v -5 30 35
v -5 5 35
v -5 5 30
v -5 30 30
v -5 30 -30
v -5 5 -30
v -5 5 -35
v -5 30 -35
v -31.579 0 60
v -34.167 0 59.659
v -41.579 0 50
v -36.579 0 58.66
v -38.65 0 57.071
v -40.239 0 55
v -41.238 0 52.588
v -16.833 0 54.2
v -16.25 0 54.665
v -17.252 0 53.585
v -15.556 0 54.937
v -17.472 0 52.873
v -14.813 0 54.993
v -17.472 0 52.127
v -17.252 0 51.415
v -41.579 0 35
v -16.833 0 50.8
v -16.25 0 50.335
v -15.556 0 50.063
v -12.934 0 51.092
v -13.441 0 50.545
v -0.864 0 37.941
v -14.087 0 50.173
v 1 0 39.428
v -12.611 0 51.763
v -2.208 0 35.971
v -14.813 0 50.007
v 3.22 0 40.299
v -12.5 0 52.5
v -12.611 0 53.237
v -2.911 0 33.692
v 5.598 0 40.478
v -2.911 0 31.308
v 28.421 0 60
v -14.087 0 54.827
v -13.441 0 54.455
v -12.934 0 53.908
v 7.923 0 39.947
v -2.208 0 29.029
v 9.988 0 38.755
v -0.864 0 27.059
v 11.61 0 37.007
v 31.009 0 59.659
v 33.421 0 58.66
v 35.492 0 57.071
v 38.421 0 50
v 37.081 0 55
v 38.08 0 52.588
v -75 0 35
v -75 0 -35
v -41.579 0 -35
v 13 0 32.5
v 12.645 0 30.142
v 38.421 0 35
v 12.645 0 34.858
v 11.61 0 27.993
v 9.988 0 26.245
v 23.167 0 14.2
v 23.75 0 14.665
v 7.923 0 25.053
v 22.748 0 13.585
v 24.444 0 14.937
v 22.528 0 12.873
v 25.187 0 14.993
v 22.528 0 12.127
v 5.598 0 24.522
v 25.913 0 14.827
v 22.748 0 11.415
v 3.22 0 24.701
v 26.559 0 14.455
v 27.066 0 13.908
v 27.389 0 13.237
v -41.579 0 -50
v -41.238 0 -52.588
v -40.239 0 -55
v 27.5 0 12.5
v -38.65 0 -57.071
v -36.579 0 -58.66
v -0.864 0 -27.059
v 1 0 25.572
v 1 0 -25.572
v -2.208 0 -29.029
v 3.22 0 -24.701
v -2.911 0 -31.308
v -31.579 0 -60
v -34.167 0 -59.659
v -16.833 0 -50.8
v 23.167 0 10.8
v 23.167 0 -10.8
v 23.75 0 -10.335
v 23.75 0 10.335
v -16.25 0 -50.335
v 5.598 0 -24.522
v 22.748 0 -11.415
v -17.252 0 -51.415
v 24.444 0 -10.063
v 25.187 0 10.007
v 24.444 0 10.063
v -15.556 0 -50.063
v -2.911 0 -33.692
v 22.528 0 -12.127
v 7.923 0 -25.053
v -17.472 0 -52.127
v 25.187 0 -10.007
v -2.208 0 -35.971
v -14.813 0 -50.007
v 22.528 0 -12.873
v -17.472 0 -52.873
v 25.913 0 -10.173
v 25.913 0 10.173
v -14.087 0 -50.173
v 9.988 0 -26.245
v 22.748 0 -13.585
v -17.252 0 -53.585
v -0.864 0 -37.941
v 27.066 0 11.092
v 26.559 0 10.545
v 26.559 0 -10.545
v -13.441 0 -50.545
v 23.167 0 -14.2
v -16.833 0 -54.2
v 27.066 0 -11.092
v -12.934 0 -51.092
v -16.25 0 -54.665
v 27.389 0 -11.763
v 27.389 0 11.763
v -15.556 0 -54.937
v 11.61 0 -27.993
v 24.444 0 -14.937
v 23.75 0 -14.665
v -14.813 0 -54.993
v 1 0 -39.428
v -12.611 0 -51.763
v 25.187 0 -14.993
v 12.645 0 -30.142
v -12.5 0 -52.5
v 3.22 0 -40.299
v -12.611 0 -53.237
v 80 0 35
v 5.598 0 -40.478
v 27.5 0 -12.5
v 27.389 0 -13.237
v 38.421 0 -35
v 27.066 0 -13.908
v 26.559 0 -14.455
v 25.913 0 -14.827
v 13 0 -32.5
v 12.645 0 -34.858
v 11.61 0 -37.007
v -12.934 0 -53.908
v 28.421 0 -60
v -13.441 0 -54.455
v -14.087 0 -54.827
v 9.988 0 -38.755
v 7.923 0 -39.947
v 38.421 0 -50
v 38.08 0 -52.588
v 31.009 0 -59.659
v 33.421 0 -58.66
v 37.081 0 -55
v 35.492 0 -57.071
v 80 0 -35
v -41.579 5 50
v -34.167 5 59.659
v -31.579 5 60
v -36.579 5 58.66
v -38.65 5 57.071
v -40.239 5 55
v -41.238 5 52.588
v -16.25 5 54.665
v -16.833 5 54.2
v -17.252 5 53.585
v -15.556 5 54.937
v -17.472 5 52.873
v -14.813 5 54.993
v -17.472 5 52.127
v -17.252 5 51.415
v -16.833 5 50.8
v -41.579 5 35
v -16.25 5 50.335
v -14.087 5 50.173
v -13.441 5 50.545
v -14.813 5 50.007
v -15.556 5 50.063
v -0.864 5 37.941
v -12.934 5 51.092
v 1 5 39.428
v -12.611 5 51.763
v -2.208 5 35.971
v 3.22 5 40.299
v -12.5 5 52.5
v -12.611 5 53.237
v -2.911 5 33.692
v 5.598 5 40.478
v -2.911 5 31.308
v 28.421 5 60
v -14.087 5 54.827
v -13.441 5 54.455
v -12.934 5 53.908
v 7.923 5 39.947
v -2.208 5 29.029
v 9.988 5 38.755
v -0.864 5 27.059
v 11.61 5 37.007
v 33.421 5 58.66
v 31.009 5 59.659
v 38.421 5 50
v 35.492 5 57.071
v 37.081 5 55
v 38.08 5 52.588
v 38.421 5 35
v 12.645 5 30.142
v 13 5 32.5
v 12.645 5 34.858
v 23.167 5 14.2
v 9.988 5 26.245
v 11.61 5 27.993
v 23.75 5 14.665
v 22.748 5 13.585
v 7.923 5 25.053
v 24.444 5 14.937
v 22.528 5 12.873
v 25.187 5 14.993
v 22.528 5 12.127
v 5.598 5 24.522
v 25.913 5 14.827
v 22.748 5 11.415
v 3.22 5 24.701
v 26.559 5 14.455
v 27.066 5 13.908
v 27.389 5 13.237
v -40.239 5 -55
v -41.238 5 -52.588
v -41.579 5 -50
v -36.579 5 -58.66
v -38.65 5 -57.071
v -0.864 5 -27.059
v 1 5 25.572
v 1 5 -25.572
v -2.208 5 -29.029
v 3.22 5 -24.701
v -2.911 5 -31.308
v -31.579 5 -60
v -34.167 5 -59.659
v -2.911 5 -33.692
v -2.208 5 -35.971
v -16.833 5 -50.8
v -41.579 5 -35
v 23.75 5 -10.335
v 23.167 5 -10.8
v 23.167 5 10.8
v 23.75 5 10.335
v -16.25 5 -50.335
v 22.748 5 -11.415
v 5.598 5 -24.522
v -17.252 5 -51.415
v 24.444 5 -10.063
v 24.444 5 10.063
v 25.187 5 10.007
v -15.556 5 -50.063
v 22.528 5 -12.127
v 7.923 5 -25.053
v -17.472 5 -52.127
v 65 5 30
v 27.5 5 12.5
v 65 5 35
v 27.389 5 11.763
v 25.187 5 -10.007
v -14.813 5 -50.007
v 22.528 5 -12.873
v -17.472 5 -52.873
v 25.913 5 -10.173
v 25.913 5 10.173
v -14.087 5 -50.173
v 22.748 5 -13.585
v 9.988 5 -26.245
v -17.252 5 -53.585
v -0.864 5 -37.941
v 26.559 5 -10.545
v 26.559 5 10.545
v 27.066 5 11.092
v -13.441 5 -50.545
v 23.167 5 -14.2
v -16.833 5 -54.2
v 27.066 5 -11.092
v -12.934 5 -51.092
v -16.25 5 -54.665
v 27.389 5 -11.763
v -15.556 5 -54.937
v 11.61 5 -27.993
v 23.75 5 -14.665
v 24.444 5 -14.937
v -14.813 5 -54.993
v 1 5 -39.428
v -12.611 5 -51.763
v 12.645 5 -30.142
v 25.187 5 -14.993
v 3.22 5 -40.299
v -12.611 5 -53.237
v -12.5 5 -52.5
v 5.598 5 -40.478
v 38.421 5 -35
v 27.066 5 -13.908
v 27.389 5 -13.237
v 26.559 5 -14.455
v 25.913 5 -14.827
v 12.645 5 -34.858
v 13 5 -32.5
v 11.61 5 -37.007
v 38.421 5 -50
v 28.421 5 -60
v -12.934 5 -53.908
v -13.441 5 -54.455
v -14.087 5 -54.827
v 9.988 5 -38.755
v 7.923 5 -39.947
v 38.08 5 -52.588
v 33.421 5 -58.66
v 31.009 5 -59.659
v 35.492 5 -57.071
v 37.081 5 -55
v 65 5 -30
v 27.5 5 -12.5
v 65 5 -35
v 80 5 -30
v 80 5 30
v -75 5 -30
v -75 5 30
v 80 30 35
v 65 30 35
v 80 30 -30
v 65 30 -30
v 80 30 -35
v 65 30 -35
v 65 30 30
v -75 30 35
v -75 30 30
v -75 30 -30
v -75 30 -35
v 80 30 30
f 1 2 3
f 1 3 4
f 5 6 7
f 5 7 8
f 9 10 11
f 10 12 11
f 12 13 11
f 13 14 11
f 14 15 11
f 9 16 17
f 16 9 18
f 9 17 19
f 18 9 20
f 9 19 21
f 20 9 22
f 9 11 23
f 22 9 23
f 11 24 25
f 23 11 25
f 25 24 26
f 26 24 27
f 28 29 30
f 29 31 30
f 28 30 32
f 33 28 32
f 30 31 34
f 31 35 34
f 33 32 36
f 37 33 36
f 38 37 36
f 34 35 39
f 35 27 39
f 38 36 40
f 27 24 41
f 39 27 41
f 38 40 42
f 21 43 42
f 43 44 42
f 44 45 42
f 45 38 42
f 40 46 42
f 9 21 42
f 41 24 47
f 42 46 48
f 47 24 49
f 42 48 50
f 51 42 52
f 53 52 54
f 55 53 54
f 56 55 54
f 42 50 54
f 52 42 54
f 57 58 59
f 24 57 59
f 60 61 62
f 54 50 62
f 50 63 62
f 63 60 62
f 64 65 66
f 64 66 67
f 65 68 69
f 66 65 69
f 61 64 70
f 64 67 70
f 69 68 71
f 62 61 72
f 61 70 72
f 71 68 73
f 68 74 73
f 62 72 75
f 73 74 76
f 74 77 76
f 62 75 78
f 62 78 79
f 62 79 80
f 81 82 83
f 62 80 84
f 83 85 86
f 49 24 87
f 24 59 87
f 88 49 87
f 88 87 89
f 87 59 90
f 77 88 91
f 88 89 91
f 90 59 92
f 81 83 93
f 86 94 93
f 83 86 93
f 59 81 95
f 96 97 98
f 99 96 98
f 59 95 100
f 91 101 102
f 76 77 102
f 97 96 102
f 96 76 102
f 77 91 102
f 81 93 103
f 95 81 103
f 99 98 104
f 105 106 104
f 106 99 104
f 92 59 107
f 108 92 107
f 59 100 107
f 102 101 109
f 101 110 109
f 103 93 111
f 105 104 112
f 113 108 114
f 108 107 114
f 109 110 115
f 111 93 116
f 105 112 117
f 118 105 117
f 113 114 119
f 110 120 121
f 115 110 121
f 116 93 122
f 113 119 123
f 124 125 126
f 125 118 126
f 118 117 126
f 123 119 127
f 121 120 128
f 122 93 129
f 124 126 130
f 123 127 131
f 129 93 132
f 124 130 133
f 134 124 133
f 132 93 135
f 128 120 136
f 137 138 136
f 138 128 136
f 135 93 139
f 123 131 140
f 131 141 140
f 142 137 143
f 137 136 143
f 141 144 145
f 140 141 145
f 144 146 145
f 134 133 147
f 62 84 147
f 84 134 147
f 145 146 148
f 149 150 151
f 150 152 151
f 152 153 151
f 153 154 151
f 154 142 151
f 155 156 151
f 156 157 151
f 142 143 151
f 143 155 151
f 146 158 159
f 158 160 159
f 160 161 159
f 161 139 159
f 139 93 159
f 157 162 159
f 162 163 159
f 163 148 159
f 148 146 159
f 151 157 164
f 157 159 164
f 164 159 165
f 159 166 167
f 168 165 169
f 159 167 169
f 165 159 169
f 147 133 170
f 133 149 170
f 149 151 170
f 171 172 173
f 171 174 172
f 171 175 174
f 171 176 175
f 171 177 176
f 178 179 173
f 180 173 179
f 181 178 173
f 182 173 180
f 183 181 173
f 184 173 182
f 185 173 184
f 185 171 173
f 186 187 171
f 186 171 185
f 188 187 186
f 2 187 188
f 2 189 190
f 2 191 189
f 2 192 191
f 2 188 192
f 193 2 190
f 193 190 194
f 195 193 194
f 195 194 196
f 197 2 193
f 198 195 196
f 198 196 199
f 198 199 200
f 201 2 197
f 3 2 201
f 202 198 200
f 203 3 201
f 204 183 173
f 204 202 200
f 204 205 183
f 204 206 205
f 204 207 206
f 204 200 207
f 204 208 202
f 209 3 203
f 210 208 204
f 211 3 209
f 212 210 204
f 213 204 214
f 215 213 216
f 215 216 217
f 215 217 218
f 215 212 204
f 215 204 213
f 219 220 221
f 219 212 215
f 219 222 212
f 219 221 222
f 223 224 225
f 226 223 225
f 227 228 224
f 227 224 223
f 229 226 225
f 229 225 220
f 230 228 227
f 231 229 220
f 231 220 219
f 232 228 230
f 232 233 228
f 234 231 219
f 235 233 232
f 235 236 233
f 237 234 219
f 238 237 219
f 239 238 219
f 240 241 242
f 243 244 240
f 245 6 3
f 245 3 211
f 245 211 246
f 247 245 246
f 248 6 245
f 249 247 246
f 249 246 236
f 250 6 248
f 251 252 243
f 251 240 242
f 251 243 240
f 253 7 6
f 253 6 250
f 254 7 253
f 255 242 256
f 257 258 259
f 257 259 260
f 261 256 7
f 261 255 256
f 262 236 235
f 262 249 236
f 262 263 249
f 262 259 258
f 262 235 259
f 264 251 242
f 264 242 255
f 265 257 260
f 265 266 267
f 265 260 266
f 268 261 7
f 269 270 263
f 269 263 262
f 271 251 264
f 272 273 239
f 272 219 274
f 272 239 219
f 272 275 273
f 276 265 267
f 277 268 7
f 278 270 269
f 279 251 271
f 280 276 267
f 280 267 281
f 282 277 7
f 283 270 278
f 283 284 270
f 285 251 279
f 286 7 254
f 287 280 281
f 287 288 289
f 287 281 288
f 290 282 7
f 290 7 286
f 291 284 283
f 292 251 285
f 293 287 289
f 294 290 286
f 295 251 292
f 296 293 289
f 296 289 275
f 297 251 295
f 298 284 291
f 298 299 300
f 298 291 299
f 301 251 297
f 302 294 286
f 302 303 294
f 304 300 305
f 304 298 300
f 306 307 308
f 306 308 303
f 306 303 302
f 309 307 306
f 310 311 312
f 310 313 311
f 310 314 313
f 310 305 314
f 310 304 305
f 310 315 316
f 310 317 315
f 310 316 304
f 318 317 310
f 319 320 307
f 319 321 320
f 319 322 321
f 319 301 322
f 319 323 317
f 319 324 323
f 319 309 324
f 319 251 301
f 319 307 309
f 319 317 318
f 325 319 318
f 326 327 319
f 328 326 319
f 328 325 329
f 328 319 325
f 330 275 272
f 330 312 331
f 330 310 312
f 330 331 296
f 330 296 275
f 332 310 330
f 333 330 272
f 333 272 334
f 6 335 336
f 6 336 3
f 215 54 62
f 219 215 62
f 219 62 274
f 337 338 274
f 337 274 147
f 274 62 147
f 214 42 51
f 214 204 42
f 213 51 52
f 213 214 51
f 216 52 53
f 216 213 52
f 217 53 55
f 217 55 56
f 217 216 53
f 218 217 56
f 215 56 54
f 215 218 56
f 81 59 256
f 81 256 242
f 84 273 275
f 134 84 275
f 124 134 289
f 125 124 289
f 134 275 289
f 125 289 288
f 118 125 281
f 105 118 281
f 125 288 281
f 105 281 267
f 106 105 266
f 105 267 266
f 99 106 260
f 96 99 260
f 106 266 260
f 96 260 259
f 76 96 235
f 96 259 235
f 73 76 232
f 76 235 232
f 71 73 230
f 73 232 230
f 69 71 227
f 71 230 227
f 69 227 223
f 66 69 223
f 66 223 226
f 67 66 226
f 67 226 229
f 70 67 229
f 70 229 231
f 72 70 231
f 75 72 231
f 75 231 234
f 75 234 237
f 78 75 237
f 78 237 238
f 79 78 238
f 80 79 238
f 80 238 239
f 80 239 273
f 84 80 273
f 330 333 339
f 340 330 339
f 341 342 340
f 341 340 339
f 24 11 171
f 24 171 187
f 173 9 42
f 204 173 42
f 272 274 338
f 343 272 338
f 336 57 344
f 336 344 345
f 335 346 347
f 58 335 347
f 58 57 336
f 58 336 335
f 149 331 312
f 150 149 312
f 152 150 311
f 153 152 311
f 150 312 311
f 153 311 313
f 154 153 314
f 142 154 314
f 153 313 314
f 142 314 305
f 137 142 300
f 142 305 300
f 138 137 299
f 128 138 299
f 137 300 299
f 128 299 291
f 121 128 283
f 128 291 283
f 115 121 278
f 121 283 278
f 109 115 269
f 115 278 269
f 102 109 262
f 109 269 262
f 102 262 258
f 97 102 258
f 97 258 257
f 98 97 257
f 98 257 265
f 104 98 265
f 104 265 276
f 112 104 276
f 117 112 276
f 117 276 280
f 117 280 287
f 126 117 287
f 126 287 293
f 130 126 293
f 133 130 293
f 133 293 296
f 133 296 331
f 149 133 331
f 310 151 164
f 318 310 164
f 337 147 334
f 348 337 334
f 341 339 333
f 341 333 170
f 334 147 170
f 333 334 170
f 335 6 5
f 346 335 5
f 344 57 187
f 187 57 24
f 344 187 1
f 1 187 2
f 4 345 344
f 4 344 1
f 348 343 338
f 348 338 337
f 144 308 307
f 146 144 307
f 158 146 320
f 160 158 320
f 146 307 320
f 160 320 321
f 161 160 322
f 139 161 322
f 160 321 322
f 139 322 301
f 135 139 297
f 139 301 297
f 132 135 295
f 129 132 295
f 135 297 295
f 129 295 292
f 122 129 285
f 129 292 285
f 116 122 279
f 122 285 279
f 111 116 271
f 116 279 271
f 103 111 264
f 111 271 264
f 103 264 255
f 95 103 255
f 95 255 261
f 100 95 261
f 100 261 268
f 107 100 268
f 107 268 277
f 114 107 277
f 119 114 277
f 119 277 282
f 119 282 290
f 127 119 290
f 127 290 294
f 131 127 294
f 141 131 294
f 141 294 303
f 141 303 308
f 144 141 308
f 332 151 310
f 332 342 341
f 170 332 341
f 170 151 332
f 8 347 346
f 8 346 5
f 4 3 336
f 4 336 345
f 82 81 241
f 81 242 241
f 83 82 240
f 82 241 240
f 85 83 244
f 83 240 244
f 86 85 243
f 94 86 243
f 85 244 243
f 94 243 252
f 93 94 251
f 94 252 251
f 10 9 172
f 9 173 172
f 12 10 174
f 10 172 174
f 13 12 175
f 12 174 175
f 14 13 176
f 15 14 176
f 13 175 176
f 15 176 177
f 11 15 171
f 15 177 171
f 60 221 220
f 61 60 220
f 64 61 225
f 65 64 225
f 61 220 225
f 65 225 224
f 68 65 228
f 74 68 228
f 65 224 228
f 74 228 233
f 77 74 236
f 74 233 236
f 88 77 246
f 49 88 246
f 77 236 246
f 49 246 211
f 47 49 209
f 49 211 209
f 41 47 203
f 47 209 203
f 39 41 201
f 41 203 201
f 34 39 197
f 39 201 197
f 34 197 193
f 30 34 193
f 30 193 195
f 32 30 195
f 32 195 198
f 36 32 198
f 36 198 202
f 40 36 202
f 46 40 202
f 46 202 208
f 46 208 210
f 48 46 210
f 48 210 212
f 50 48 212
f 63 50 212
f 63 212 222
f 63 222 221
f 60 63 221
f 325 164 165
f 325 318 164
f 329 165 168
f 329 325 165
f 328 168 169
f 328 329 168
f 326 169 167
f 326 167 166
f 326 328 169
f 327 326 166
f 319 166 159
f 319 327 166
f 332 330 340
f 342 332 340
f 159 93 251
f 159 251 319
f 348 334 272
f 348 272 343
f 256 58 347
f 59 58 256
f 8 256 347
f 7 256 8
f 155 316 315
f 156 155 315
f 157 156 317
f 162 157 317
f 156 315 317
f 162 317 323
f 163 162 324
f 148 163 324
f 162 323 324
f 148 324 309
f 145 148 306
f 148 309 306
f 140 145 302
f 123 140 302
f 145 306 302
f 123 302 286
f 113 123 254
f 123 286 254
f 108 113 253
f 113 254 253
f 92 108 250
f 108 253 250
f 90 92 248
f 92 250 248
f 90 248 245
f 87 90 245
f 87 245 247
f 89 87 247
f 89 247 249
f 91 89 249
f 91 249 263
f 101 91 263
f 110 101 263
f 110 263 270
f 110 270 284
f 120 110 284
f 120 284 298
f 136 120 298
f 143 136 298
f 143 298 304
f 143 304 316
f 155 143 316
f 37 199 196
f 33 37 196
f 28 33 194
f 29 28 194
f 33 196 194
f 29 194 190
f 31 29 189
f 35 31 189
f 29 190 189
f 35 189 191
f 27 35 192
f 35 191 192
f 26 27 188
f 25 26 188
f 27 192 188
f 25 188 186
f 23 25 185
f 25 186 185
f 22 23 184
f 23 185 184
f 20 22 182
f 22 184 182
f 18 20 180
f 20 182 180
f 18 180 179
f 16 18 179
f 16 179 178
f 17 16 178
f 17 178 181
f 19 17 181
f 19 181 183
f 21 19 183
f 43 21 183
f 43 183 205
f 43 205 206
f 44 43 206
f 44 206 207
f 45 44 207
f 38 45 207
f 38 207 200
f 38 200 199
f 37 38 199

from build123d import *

# Parameters (mm, degrees)
SKETCH1_W           = 155
SKETCH1_H           = 70
BOSS_EXTRUDE1_DEPTH = 30
SKETCH2_W           = 70
SKETCH2_H           = 25
CUT_EXTRUDE1_DEPTH  = 71
SKETCH5_W           = 60
SKETCH5_H           = 25
CUT_EXTRUDE2_DEPTH  = 156
SKETCH6_W           = 80
SKETCH6_H           = 25
BOSS_EXTRUDE2_DEPTH = 5
SKETCH8_R           = 8
SKETCH8_R_2         = 2.5
CUT_EXTRUDE4_DEPTH  = 6
FILLET5_R           = 10
FILLET6_R           = 10


with BuildPart() as part:
    # Sketch1 → Boss-Extrude1 (new body)
    with BuildSketch(Plane(origin=(0, 0, 0), x_dir=(1, 0, 0), z_dir=(0, 1, 0))):
        with Locations((2.5, 0)):
            Rectangle(SKETCH1_W, SKETCH1_H)
    extrude(amount=BOSS_EXTRUDE1_DEPTH)

    # Sketch2 → Cut-Extrude1 (cut, through all)
    with BuildSketch(Plane.XY.offset(35)):
        with Locations((30, 17.5)):
            Rectangle(SKETCH2_W, SKETCH2_H)
    extrude(amount=-CUT_EXTRUDE1_DEPTH, mode=Mode.SUBTRACT)

    # Sketch5 → Cut-Extrude2 (cut, through all)
    with BuildSketch(Plane(origin=(80, 0, 0), x_dir=(0, 0, -1), z_dir=(1, 0, 0))):
        with Locations((0, 17.5)):
            Rectangle(SKETCH5_W, SKETCH5_H)
    extrude(amount=-CUT_EXTRUDE2_DEPTH, mode=Mode.SUBTRACT)

    # Sketch6 → Boss-Extrude2 (add)
    with BuildSketch(Plane(origin=(0, 0, 0), x_dir=(1, 0, 0), z_dir=(0, 1, 0))):
        with Locations((-1.578945933, -47.5)):
            Rectangle(SKETCH6_W, SKETCH6_H)
        with Locations((-1.578945933, 47.5)):
            Rectangle(SKETCH6_W, SKETCH6_H)
    extrude(amount=BOSS_EXTRUDE2_DEPTH)

    # Sketch8 → Cut-Extrude4 (cut, through all)
    with BuildSketch(Plane(origin=(0, 5, 0), x_dir=(1, 0, 0), z_dir=(0, 1, 0))):
        with Locations((5, 32.5)):
            Circle(SKETCH8_R)
        with Locations((5, -32.5)):
            Circle(SKETCH8_R)
        with Locations((-15, 52.5)):
            Circle(SKETCH8_R_2)
        with Locations((25, 12.5)):
            Circle(SKETCH8_R_2)
        with Locations((-15, -52.5)):
            Circle(SKETCH8_R_2)
        with Locations((25, -12.5)):
            Circle(SKETCH8_R_2)
    extrude(amount=-CUT_EXTRUDE4_DEPTH, mode=Mode.SUBTRACT)

    # Fillet5
    fillet5_edges = [part.edges().sort_by_distance(p)[0] for p in [
        (38.421054067, 2.5, 60),
    ]]
    fillet(fillet5_edges, radius=FILLET5_R)

    # Fillet6
    fillet6_edges = [part.edges().sort_by_distance(p)[0] for p in [
        (-41.578945933, 2.5, -60),
        (38.421054067, 2.5, -60),
        (-41.578945933, 2.5, 60),
    ]]
    fillet(fillet6_edges, radius=FILLET6_R)


solid = part.part
